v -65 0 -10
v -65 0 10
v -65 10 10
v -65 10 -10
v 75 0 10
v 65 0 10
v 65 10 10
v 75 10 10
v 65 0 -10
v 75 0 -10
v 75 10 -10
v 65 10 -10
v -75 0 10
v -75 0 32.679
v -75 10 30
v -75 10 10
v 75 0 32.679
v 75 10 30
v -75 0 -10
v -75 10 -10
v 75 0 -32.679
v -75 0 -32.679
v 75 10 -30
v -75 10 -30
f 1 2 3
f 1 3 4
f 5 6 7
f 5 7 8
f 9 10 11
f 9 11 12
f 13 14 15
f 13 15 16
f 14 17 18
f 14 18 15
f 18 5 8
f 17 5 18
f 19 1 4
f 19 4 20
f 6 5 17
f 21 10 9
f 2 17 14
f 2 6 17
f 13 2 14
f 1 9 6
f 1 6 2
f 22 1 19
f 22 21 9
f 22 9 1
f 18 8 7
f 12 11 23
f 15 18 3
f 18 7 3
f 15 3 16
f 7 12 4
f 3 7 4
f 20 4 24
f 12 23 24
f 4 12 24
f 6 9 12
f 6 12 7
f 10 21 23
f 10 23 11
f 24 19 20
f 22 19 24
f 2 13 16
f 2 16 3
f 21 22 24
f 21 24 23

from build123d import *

# Parameters (mm, degrees)
BOSS_EXTRUDE1_DEPTH = 10
DRAFT1_ANGLE        = 15


with BuildPart() as part:
    # Sketch1 → Boss-Extrude1 (new body)
    with BuildSketch(Plane(origin=(0, 0, 0), x_dir=(1, 0, 0), z_dir=(0, 1, 0))):
        Polygon((-75, 30), (75, 30), (75, 10), (65, 10), (65, -10), (75, -10), (75, -30), (-75, -30), (-75, -10), (-65, -10), (-65, 10), (-75, 10), align=None)
    extrude(amount=BOSS_EXTRUDE1_DEPTH)

    # Draft1
    draft1_faces = [part.faces().sort_by_distance(p)[0] for p in [
        (0, 5, 30),
        (0, 5, -30),
    ]]
    draft(draft1_faces, Plane.ZX.offset(10), DRAFT1_ANGLE)


solid = part.part
